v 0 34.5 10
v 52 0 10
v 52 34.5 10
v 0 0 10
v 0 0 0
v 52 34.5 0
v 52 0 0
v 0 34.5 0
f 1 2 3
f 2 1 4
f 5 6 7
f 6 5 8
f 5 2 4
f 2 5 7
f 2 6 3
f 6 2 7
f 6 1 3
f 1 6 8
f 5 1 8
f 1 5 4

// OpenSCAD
// Manufacturer-listed bounding volumes, not detailed cell models or an assembly.
// See docs/assembly-candidates.md. No fit, material or electrical approval implied.
pack = "jauch1900";
length = pack == "jauch1900" ? 52.0 : pack == "jauch2050" ? 84.5 : 38.5;
width = pack == "jauch1900" ? 34.5 : pack == "jauch2050" ? 47.5 : 18.5;
thickness = pack == "jauch1900" ? 10.0 : pack == "jauch2050" ? 5.2 : 5.6;
assert(pack == "jauch1900" || pack == "jauch2050" || pack == "jauch350");
cube([length,width,thickness]);
echo(pack=pack, listed_body_mm=[length,width,thickness],
     selected=false, frame_fit_verified=false);
